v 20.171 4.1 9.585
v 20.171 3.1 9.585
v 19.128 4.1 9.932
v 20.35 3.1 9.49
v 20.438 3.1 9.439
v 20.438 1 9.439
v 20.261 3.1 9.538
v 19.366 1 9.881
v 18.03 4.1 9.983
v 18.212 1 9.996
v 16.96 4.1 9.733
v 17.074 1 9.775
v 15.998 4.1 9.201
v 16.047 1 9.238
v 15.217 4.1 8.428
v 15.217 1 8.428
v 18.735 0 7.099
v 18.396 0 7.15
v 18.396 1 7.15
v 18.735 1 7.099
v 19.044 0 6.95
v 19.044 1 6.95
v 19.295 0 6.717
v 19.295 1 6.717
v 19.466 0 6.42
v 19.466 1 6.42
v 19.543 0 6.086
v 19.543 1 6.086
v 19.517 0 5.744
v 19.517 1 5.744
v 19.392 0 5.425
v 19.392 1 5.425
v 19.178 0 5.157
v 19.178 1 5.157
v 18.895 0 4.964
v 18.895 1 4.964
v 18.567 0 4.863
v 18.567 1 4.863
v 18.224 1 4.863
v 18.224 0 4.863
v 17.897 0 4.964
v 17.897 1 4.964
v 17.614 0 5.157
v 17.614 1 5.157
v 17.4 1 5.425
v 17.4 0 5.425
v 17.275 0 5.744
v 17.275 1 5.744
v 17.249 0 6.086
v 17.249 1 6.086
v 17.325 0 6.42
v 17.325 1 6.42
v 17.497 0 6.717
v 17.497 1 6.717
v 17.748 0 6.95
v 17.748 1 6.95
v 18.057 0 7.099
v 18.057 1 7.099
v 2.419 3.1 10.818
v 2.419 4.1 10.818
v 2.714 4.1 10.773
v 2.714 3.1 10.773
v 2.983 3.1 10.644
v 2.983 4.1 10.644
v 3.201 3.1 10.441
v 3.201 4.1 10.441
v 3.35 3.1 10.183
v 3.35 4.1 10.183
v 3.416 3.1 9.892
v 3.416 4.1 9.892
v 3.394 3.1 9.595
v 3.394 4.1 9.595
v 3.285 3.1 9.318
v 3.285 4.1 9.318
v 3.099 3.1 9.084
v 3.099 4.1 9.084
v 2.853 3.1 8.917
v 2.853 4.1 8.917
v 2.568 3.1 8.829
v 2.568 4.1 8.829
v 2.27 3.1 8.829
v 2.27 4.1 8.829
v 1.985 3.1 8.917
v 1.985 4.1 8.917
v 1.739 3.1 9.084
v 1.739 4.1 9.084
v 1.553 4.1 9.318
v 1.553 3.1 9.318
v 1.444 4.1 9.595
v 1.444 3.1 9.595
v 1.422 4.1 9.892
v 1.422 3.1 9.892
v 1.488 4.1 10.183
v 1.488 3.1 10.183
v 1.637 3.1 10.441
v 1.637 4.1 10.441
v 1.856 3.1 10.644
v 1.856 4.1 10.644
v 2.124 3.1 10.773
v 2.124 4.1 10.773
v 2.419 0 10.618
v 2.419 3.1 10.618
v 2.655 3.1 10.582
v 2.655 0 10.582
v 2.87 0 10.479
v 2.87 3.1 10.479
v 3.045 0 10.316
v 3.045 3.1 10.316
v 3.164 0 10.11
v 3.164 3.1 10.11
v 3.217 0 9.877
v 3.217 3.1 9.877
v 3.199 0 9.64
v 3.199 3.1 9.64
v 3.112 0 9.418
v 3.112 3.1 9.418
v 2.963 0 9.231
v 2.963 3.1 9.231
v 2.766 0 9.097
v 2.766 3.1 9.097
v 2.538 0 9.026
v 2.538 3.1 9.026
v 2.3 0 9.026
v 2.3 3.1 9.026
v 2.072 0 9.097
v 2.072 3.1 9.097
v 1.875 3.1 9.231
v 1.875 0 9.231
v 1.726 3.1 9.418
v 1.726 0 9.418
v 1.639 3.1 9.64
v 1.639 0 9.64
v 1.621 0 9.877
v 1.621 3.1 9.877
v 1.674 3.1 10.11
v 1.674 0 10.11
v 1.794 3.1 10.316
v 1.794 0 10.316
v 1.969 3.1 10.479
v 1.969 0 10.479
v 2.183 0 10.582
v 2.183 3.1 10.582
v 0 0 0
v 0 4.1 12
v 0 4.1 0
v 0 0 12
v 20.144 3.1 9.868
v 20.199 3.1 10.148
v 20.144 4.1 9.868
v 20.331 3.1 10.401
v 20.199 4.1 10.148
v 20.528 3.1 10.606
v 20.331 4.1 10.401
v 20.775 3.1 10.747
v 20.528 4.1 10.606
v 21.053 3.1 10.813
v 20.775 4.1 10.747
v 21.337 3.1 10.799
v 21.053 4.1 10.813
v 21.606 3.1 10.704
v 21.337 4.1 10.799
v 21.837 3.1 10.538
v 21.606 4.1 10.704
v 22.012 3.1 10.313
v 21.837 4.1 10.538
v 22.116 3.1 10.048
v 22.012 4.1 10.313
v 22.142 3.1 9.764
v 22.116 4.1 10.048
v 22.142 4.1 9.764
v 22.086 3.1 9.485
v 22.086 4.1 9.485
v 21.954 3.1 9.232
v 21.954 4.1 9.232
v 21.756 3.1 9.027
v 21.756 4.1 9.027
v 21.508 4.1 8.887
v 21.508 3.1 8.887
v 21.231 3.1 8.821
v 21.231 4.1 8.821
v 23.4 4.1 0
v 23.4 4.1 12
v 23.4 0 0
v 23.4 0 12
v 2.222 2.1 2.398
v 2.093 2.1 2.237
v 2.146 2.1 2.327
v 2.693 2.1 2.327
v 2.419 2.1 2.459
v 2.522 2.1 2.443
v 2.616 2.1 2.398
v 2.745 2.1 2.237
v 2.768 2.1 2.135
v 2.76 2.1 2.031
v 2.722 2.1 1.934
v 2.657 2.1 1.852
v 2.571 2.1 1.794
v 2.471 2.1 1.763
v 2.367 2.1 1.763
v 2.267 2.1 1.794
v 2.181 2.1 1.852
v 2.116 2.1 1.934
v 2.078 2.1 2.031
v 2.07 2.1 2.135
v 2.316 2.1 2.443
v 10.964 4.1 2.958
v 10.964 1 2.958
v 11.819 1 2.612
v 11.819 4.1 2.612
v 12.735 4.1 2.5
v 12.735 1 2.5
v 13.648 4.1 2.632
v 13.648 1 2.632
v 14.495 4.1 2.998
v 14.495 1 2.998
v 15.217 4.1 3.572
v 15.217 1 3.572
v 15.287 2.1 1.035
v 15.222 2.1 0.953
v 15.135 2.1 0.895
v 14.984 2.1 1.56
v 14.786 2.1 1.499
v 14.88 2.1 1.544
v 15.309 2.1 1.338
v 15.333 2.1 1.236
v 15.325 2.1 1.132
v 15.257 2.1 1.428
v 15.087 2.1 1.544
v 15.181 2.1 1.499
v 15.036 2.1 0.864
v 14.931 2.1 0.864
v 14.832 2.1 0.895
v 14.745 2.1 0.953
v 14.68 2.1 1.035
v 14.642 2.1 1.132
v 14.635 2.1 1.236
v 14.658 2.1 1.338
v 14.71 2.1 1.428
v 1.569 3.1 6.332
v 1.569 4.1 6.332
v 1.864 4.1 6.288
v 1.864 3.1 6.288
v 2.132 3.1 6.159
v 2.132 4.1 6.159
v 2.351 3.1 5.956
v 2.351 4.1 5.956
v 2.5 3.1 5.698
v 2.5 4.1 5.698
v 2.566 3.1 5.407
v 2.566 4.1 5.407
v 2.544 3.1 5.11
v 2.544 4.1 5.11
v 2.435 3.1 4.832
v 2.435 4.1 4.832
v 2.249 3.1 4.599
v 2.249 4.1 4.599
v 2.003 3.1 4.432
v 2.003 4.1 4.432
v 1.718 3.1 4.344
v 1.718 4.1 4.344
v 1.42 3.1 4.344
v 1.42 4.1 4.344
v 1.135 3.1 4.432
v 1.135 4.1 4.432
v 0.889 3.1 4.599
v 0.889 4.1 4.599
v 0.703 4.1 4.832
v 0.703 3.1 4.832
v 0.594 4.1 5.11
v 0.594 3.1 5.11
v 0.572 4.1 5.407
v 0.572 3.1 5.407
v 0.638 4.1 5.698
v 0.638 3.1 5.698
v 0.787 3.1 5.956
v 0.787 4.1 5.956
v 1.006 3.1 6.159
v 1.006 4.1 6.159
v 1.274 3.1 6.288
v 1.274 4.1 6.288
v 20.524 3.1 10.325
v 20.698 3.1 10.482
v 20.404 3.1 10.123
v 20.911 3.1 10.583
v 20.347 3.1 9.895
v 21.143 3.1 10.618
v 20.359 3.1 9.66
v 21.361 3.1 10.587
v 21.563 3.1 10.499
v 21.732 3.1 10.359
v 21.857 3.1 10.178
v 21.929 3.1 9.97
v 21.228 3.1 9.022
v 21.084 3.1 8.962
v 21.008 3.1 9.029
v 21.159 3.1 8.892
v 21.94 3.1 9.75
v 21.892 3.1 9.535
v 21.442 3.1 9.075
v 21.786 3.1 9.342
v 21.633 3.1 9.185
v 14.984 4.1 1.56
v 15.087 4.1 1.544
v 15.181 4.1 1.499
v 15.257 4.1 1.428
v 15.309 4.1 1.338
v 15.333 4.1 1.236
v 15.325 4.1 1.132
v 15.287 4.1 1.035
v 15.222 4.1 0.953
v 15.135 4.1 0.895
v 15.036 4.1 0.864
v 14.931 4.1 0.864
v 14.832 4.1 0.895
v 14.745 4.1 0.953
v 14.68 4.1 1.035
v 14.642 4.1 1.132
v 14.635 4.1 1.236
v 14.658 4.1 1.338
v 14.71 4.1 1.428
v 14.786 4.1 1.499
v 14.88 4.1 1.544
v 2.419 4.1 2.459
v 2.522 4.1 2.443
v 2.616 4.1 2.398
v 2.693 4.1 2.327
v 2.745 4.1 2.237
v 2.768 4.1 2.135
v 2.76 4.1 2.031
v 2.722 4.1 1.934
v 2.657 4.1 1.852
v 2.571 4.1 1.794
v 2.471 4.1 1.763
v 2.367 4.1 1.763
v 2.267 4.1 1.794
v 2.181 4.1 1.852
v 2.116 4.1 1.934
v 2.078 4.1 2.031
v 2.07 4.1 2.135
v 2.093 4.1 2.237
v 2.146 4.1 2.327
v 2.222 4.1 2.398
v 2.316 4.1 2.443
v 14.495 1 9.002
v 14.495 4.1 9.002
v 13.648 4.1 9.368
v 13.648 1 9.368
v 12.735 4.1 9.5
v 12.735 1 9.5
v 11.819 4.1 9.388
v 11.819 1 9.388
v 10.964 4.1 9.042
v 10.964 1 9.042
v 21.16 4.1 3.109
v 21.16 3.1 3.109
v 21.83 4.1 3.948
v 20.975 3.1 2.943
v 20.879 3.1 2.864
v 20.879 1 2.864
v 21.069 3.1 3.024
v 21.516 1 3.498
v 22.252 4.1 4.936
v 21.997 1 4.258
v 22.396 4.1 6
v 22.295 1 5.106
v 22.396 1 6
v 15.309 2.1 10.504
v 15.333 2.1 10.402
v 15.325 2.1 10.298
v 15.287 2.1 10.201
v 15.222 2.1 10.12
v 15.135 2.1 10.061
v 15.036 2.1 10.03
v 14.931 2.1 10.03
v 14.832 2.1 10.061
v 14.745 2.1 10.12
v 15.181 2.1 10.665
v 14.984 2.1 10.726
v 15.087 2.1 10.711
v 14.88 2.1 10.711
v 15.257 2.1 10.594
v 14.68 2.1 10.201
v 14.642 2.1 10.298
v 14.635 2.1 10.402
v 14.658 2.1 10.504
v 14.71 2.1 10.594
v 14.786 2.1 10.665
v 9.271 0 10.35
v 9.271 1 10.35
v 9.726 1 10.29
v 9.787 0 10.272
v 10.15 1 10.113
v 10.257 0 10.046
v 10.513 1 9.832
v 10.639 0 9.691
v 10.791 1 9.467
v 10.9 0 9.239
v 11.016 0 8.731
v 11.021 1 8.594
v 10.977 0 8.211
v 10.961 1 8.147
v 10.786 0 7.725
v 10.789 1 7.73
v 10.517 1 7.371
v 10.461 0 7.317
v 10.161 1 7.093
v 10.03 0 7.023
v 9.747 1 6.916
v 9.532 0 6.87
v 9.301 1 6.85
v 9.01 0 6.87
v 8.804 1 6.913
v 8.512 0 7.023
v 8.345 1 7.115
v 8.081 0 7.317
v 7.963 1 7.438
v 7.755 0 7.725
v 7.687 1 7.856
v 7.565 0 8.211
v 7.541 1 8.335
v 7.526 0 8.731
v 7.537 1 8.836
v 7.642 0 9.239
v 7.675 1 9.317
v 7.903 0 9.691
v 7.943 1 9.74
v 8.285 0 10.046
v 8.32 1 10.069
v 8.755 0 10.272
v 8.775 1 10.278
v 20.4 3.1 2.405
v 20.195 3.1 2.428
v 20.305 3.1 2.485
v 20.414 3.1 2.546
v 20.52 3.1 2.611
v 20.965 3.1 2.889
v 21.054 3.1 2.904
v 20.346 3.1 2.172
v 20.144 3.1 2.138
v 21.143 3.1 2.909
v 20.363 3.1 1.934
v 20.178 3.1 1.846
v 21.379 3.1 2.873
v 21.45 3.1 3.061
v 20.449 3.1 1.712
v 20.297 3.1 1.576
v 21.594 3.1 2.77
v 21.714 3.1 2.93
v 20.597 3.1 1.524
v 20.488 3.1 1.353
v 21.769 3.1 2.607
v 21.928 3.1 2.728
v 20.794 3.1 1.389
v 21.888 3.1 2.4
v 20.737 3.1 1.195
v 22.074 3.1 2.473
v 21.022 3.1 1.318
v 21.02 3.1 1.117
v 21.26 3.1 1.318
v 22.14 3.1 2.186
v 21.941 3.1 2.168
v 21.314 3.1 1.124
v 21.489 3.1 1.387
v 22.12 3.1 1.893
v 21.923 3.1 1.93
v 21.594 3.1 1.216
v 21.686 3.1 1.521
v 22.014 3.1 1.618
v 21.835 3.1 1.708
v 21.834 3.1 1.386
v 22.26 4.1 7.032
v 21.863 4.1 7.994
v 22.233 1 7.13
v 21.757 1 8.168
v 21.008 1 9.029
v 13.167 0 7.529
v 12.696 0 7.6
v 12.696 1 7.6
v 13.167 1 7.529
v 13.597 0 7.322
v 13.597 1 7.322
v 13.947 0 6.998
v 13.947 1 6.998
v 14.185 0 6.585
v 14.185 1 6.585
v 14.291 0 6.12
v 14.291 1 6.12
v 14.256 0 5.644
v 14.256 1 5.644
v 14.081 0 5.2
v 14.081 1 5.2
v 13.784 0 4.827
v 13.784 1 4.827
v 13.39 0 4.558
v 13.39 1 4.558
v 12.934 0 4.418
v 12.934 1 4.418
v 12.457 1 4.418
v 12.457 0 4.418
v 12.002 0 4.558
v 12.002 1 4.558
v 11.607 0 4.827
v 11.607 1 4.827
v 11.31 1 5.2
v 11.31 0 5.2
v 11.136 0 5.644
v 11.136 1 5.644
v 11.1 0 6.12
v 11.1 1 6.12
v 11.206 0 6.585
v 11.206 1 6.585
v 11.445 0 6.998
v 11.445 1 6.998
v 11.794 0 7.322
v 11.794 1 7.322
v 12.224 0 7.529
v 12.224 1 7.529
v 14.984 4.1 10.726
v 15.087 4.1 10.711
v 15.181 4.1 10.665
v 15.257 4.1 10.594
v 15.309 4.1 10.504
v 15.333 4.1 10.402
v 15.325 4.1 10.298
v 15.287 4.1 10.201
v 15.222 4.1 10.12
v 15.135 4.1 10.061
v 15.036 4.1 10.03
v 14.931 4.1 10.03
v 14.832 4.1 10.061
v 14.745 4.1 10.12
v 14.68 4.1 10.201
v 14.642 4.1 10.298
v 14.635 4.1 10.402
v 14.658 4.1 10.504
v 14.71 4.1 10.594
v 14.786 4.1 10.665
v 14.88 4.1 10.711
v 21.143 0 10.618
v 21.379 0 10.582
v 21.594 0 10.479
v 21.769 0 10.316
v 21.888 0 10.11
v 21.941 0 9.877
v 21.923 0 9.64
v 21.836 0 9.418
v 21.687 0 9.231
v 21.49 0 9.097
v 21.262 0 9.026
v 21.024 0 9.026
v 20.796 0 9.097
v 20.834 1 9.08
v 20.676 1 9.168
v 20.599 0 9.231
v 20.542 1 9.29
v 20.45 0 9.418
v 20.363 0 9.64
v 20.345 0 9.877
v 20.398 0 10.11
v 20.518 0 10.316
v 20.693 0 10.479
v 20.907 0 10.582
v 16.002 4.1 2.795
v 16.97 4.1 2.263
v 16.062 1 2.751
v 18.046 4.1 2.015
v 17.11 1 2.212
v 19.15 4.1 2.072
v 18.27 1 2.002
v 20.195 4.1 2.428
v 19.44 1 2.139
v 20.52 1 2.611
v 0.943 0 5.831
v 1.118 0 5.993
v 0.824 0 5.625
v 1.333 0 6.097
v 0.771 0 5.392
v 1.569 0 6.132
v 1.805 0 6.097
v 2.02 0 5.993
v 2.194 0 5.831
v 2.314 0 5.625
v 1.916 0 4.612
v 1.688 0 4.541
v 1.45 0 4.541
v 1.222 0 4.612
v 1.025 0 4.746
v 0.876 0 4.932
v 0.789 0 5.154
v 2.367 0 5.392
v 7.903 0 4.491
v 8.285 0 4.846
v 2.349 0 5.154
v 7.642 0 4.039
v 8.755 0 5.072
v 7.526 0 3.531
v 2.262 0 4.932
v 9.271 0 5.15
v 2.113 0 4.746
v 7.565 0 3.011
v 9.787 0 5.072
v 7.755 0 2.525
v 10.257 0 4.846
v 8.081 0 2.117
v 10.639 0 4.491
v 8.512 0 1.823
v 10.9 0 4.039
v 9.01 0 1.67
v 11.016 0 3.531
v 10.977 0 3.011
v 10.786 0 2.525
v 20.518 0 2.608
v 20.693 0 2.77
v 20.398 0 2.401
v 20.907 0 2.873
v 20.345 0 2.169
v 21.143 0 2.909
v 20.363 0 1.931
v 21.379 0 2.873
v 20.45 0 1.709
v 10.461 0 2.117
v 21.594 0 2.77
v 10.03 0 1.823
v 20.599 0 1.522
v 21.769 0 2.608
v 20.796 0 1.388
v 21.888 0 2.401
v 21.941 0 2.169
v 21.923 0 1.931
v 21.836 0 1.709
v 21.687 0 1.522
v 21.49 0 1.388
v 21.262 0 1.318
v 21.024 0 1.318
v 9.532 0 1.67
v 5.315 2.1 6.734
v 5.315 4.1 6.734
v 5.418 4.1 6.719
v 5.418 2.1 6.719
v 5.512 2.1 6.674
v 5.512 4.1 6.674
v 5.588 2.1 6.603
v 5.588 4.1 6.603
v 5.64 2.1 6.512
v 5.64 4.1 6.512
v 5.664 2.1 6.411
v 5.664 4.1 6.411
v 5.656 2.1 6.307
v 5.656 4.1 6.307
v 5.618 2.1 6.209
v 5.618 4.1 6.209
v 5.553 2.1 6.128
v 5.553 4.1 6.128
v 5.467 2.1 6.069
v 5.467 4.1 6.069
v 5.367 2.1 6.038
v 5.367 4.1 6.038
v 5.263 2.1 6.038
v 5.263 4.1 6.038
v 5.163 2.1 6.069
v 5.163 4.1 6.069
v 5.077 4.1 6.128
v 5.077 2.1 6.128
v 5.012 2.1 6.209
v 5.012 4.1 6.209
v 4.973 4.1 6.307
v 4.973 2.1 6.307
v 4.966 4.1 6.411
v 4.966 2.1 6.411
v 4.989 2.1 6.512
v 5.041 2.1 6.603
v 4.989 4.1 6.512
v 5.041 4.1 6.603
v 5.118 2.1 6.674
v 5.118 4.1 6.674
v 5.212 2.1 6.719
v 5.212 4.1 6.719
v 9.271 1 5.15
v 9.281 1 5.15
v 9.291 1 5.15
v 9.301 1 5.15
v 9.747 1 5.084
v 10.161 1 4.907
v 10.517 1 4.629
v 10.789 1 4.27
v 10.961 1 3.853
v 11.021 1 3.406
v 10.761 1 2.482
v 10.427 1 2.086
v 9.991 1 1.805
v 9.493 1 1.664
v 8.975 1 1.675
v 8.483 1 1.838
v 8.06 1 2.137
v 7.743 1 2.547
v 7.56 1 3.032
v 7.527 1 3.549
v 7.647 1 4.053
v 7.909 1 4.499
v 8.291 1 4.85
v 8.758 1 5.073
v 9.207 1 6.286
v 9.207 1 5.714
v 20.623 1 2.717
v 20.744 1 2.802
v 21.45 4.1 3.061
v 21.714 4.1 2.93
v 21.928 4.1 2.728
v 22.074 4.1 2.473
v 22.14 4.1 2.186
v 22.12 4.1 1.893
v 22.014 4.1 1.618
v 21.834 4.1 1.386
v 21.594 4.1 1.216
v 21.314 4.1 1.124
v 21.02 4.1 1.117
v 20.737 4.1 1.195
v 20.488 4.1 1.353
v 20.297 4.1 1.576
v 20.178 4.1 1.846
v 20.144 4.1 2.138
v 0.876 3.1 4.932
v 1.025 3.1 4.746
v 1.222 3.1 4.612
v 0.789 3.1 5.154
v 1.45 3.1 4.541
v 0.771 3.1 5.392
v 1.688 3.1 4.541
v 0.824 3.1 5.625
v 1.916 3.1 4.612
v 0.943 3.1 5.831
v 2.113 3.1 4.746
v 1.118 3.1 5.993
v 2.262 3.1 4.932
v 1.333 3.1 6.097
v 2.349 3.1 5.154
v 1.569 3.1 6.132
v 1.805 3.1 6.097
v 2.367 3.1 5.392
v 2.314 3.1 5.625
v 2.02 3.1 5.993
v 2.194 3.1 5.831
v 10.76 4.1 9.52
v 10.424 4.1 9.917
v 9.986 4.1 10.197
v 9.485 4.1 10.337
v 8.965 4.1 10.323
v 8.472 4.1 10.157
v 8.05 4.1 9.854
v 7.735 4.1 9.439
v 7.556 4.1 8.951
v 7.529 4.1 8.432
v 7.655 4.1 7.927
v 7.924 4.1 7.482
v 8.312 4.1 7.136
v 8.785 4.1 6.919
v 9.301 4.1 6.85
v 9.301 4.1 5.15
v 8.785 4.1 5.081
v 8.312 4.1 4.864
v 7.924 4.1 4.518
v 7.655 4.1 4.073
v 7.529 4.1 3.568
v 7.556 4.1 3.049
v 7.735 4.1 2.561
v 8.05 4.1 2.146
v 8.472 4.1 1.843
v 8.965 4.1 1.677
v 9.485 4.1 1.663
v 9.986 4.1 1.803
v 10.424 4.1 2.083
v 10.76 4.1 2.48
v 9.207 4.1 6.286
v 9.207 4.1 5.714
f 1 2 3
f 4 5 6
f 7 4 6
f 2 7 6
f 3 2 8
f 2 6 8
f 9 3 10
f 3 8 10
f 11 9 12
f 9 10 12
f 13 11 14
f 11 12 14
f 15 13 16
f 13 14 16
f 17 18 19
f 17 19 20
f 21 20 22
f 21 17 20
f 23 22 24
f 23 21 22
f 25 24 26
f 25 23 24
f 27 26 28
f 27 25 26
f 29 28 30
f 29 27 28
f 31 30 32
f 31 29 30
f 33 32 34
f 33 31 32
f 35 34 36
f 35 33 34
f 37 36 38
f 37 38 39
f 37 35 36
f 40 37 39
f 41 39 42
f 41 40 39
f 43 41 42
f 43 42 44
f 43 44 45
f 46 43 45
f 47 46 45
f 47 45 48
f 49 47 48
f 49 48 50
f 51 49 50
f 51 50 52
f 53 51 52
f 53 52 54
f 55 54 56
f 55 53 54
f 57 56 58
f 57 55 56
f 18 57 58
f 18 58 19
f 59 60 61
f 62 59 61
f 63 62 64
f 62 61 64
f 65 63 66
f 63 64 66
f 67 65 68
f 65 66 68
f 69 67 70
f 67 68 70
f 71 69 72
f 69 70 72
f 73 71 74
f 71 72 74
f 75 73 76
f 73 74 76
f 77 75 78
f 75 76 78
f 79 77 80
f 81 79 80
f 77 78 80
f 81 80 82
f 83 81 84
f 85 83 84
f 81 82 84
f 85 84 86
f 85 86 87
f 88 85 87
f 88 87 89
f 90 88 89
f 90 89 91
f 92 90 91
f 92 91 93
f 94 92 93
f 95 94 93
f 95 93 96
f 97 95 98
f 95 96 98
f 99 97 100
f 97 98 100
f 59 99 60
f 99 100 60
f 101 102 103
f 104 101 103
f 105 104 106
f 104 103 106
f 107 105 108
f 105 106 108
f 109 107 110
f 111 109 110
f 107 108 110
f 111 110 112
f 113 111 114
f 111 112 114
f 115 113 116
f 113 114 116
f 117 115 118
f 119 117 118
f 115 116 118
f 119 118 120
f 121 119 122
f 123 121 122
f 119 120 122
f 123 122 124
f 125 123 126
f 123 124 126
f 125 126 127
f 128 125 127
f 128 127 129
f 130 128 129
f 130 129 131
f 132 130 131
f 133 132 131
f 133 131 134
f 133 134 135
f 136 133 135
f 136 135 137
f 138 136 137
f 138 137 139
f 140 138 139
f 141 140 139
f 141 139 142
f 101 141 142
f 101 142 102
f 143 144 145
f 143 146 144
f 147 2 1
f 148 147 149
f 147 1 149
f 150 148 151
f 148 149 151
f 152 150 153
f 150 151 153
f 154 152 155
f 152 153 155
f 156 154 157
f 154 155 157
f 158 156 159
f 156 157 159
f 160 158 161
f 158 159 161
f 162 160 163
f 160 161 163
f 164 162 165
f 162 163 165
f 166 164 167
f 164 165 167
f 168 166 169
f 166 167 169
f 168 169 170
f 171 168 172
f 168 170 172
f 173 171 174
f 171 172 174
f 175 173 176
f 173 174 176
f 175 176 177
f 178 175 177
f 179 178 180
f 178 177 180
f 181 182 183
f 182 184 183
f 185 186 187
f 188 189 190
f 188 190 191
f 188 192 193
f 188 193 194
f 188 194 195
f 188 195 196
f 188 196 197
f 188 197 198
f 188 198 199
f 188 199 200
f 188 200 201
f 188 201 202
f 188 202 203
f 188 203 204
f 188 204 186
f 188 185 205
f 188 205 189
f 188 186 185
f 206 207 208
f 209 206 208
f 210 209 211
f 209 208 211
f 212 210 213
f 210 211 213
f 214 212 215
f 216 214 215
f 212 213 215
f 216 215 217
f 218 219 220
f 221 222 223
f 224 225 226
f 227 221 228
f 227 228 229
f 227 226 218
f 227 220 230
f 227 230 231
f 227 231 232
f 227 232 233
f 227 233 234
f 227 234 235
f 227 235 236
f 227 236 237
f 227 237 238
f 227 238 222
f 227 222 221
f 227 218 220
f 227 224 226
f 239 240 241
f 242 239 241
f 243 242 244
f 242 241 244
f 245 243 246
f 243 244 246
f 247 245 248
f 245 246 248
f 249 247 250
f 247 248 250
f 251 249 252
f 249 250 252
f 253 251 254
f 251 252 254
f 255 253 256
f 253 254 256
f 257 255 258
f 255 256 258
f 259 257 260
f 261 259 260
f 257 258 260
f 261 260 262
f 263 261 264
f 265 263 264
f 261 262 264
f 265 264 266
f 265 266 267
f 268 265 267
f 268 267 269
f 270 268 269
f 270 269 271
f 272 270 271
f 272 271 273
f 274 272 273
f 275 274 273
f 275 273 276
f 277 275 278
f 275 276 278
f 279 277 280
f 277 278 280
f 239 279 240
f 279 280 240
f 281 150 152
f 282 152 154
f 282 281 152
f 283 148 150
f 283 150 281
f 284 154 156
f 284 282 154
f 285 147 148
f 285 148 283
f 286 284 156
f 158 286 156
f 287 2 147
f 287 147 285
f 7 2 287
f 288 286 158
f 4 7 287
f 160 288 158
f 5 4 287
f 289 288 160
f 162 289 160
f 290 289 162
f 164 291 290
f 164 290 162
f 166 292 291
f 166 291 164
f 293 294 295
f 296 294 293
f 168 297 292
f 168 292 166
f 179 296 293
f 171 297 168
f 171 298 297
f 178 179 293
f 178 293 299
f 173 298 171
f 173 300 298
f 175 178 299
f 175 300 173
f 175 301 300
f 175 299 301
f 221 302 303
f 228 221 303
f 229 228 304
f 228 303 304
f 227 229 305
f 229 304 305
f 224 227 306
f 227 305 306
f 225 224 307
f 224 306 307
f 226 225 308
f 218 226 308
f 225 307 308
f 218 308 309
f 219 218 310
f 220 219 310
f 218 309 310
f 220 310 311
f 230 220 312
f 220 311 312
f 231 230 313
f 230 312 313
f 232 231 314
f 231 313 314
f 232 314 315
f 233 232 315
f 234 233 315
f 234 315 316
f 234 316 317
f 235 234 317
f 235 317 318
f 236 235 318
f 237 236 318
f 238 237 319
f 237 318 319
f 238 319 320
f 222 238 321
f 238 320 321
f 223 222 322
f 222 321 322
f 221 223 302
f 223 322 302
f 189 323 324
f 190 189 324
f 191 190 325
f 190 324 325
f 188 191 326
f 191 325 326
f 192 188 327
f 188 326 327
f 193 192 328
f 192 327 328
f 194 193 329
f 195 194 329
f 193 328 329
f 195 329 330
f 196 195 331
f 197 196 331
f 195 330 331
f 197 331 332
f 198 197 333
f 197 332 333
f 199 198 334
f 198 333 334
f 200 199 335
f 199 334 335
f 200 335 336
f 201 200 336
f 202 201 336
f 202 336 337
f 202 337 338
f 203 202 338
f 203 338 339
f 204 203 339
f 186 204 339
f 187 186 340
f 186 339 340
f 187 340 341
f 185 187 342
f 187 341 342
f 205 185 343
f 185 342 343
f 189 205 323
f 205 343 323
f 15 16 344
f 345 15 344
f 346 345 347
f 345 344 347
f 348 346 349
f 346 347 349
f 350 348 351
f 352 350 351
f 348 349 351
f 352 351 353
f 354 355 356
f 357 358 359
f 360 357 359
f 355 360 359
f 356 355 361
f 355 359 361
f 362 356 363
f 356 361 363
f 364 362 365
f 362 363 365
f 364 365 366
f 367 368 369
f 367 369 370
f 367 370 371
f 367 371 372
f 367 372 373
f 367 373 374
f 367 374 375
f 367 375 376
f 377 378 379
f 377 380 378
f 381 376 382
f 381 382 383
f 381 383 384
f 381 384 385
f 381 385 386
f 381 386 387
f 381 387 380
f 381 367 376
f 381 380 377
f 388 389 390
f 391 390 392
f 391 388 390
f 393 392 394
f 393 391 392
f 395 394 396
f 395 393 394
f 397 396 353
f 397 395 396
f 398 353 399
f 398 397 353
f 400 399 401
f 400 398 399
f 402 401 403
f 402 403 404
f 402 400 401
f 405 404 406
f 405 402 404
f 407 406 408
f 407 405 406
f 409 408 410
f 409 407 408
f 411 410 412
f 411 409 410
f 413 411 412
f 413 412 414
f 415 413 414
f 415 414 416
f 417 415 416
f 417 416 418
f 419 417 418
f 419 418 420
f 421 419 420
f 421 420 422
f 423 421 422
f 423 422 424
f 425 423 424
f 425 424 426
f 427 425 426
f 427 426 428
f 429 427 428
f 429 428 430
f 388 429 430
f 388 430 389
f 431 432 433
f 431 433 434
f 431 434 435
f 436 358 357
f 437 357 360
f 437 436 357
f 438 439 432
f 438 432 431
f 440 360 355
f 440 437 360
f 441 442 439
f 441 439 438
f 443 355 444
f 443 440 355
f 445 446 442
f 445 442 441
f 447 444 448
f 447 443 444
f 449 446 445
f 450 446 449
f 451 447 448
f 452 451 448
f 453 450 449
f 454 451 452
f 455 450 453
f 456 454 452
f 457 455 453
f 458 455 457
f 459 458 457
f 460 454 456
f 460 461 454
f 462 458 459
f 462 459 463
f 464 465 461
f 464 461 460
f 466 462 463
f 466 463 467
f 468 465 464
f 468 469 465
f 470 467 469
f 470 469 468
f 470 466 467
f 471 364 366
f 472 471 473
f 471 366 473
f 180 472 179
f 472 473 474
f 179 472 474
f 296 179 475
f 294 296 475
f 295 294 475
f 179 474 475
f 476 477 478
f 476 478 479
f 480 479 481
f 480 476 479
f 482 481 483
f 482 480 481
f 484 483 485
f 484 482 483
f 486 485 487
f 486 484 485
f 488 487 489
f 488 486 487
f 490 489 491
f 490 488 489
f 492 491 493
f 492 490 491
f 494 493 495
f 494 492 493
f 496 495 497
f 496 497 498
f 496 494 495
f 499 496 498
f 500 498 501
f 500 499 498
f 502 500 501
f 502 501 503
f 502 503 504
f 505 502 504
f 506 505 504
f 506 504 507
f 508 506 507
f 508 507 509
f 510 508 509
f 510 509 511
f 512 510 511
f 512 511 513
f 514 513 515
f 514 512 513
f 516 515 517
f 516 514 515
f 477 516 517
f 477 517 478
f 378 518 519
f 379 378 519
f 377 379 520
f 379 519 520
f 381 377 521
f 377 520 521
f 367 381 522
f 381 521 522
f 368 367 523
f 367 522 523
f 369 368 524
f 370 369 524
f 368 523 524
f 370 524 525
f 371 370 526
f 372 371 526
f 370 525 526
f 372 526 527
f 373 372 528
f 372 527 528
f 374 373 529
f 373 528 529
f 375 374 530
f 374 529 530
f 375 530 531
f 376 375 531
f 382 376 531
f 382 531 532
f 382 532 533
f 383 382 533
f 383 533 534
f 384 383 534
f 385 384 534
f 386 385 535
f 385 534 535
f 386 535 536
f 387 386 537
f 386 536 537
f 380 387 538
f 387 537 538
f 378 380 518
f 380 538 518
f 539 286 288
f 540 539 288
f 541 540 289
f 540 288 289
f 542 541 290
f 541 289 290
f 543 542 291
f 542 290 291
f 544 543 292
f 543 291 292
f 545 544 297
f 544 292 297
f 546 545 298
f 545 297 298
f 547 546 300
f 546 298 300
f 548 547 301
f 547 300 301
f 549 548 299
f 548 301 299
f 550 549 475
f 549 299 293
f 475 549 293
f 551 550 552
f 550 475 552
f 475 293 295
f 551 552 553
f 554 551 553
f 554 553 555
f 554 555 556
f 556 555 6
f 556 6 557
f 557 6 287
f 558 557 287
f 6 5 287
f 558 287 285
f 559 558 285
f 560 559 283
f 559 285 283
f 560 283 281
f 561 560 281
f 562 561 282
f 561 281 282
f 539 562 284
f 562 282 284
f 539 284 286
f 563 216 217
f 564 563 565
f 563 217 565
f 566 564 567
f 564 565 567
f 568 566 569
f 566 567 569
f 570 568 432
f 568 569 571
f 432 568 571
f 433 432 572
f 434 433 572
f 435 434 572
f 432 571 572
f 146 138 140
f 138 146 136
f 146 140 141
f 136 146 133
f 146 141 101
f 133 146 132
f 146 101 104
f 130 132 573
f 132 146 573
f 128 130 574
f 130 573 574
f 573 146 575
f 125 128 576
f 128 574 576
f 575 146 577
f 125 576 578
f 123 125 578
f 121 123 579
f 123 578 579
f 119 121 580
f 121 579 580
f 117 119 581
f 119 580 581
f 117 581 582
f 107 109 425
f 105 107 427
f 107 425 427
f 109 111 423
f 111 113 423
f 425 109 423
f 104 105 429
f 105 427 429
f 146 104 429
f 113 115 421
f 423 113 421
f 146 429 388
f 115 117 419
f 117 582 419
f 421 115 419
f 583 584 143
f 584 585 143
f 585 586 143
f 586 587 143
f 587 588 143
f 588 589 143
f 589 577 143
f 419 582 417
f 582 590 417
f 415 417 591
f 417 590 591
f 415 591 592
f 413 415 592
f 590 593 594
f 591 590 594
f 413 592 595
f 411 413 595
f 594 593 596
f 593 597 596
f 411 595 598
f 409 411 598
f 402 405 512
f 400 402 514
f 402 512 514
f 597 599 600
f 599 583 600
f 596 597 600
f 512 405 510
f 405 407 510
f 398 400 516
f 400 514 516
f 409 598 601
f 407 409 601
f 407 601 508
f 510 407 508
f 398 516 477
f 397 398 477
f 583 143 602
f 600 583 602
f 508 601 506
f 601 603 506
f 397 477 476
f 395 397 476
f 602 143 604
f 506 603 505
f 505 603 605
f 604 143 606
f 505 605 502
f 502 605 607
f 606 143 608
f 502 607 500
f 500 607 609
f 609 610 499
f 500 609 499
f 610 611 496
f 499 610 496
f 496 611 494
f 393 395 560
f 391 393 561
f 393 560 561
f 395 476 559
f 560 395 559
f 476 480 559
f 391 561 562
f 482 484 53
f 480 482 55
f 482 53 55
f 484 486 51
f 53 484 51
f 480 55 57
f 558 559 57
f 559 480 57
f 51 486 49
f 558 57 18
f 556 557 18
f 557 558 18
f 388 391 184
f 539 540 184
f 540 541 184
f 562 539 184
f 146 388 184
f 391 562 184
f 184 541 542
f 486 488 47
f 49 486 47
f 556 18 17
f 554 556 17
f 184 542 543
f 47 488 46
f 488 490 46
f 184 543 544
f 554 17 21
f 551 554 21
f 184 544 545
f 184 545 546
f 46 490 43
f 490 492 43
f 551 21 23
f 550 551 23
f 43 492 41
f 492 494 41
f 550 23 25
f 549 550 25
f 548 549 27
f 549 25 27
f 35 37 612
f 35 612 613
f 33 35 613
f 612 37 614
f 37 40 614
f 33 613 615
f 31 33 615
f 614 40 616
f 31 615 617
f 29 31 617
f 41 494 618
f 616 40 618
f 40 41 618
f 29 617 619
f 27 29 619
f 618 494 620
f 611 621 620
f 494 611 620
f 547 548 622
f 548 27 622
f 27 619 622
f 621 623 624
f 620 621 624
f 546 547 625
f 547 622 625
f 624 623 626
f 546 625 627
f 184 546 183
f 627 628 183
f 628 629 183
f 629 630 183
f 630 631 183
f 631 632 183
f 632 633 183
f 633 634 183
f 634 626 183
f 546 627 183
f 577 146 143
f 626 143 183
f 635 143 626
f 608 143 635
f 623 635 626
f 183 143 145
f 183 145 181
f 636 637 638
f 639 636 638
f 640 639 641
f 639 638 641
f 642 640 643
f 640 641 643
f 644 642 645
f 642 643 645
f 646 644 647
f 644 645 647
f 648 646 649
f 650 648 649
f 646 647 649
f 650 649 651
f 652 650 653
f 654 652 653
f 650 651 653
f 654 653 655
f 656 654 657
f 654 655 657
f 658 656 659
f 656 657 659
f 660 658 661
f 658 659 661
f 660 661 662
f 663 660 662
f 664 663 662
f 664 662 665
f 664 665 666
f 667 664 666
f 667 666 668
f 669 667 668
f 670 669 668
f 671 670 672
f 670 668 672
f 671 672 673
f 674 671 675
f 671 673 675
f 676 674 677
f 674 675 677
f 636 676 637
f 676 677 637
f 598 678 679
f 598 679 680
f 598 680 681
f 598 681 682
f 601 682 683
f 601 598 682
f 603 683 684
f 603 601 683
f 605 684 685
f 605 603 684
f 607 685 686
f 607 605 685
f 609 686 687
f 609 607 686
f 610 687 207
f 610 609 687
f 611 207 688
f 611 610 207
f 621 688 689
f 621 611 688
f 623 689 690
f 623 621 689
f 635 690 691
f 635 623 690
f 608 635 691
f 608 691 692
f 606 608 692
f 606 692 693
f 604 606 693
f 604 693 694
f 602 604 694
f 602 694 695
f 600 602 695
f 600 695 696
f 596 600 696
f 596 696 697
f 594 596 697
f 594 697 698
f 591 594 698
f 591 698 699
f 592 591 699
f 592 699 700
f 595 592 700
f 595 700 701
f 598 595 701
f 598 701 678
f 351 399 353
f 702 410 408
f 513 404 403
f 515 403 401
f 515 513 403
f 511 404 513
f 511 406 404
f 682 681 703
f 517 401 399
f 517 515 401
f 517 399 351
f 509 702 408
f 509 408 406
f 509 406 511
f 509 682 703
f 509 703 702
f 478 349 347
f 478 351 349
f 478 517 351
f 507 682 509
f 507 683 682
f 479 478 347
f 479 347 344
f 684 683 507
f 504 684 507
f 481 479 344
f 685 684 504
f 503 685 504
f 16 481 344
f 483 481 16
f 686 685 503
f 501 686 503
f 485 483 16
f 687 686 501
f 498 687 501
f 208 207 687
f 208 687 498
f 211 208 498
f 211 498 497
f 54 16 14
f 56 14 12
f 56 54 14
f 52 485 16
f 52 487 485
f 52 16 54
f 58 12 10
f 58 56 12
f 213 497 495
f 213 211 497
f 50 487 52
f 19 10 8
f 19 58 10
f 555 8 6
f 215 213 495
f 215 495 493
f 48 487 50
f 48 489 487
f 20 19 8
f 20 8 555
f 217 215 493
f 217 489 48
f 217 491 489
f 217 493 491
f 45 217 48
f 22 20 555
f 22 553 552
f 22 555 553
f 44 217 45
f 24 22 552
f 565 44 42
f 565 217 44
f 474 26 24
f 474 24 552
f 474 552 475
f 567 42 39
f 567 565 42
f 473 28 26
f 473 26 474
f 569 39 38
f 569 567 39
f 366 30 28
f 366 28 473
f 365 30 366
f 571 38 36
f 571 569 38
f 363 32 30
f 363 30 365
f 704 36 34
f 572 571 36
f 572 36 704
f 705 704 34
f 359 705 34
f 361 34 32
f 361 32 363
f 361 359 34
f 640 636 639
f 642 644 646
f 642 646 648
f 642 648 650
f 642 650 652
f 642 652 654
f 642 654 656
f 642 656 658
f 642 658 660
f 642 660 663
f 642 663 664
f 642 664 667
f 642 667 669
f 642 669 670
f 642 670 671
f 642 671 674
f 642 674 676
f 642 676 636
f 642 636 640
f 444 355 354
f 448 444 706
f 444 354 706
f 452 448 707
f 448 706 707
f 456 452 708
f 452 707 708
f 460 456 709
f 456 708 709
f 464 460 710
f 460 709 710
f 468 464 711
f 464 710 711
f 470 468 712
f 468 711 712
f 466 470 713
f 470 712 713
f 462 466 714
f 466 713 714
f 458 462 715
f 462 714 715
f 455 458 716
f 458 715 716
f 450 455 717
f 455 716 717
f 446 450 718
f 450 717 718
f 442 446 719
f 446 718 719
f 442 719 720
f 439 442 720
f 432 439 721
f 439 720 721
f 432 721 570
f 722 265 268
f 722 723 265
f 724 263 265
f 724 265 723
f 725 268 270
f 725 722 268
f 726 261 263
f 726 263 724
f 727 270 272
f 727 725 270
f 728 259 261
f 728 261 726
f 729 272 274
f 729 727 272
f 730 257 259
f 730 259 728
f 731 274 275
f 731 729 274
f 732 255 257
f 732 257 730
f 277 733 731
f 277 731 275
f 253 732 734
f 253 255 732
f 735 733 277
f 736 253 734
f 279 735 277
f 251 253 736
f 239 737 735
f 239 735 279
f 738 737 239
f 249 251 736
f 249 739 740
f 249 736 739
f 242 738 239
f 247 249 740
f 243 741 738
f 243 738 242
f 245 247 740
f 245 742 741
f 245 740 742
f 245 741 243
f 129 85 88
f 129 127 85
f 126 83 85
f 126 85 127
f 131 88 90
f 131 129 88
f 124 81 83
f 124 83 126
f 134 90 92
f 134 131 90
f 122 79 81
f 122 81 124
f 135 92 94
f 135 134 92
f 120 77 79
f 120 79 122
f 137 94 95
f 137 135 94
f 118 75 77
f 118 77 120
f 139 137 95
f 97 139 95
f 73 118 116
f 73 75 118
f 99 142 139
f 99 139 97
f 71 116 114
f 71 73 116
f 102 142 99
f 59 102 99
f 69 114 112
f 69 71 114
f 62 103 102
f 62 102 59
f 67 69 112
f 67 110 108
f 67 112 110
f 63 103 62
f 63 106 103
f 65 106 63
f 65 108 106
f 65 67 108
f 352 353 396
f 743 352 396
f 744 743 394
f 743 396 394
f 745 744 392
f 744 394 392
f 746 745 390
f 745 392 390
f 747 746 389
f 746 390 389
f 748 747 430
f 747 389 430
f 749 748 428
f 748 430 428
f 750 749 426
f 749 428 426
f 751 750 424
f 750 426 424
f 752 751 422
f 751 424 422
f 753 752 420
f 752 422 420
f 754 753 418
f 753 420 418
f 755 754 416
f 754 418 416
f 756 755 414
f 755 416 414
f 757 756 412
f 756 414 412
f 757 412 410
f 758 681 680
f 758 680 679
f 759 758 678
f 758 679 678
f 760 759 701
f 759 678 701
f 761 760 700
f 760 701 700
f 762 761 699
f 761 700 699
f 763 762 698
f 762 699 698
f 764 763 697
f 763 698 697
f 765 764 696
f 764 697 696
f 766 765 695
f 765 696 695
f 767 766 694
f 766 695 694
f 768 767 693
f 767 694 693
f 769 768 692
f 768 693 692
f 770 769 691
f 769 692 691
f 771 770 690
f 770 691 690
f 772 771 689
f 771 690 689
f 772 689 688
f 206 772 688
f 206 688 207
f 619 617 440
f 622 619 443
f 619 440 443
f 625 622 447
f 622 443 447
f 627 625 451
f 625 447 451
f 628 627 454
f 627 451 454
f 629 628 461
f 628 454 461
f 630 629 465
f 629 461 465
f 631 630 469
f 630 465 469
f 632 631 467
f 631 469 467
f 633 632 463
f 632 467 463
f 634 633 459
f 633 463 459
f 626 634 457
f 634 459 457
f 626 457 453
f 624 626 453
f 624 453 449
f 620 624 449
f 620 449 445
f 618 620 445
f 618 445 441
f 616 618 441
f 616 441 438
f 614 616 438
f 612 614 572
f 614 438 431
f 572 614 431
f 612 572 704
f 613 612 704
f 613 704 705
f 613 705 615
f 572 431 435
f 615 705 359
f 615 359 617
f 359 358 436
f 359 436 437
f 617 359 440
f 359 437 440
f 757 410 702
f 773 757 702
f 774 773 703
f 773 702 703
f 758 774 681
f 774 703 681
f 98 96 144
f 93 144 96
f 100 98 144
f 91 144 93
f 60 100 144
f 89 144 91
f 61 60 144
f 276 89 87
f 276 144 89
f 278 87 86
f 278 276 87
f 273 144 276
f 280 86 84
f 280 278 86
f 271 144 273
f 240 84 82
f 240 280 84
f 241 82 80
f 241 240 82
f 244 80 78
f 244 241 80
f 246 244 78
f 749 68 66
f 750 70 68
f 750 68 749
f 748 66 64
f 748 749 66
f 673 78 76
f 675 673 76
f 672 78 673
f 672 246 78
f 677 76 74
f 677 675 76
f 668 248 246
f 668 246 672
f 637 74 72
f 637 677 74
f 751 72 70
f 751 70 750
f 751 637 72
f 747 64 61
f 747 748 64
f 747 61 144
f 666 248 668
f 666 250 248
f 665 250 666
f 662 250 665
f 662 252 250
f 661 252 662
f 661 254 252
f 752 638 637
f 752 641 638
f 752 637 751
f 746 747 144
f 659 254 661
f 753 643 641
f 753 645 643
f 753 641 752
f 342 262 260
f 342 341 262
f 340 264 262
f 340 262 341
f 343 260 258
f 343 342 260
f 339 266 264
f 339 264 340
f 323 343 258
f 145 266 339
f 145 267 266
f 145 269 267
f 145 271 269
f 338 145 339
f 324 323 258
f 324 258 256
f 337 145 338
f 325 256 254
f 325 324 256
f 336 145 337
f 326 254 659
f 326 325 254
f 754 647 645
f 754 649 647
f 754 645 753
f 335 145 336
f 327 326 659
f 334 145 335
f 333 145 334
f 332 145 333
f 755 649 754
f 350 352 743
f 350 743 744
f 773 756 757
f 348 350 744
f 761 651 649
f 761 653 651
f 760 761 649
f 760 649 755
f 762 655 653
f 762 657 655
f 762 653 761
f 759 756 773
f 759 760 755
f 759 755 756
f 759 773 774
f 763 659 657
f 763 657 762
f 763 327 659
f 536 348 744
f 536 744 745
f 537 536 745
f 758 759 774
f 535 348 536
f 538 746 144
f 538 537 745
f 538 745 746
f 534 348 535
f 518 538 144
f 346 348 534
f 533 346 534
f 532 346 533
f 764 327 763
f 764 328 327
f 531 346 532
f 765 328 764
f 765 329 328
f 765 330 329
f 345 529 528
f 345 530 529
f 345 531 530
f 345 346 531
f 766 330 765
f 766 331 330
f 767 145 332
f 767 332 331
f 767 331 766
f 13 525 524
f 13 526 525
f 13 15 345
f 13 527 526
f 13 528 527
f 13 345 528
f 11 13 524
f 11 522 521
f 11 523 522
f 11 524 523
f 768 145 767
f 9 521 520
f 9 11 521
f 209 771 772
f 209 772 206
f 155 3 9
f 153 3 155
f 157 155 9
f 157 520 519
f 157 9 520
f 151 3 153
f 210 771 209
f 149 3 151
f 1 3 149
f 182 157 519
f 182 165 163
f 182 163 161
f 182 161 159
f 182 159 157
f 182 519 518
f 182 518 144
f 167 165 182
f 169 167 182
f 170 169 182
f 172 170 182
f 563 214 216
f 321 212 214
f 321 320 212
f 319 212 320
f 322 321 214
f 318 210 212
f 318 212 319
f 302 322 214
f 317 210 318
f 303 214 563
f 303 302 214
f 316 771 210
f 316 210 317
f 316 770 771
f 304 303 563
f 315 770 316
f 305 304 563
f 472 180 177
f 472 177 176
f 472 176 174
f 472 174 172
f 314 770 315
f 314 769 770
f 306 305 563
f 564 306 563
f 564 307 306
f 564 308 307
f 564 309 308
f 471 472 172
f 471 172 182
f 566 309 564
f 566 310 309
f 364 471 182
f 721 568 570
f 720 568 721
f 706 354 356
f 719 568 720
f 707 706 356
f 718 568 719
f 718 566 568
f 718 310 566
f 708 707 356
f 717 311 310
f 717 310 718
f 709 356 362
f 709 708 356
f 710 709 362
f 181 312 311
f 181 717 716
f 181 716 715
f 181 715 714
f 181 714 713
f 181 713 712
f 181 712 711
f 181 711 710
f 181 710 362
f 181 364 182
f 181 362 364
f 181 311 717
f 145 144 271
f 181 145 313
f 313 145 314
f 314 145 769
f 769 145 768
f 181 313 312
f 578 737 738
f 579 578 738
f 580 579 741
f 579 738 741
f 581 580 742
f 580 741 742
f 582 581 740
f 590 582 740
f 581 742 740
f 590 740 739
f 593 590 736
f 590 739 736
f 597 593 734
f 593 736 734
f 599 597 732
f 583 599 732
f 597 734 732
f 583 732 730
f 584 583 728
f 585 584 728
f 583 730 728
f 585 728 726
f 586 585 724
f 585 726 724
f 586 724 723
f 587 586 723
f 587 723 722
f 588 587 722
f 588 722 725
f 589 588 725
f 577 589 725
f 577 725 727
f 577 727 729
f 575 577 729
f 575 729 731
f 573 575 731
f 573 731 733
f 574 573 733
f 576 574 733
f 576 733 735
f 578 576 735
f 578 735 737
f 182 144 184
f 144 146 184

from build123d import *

# Parameters (mm, degrees)
SKETCH_1_W          = 23.4
SKETCH_1_H          = 12
SKETCH_1_R          = 1.75
SKETCH_1_R_2        = 1.6
SKETCH_1_R_3        = 1.15
EXTRUDE_1_DEPTH     = 1
EXTRUDE_START       = 1
SKETCH_1_4_W        = 23.4
SKETCH_1_4_H        = 12
EXTRUDE_2_DEPTH     = 3.1
SKETCH_3_R          = 0.35
CUT_EXTRUDE_3_DEPTH = 2
SKETCH_3_3_R        = 1
CUT_EXTRUDE_4_DEPTH = 1
SKETCH_3_4_R        = 0.8
CUT_EXTRUDE_5_DEPTH = 27.615221209


with BuildPart() as part:
    # 草图1 → 凸台-拉伸1 (new body)
    with BuildSketch(Plane(origin=(0, 0, 0), x_dir=(1, 0, 0), z_dir=(0, 1, 0))):
        with Locations((11.7, -6)):
            Rectangle(SKETCH_1_W, SKETCH_1_H)
        with Locations(Location((9.270831301, -3.4, 0), (0, 0, 270))):
            Circle(SKETCH_1_R, mode=Mode.SUBTRACT)
        with Locations(Location((9.270831301, -8.6, 0), (0, 0, 270))):
            Circle(SKETCH_1_R, mode=Mode.SUBTRACT)
        with Locations(Location((12.695740059, -6, 0), (0, 0, 270))):
            Circle(SKETCH_1_R_2, mode=Mode.SUBTRACT)
        with Locations(Location((18.395740059, -6, 0), (0, 0, 270))):
            Circle(SKETCH_1_R_3, mode=Mode.SUBTRACT)
    extrude(amount=EXTRUDE_1_DEPTH)

    # 草图1<4> → 凸台-拉伸2 (add)
    with BuildSketch(Plane(origin=(0, 0, 0), x_dir=(1, 0, 0), z_dir=(0, 1, 0)).offset(EXTRUDE_START)):
        with Locations((11.7, -6)):
            Rectangle(SKETCH_1_4_W, SKETCH_1_4_H)
        with BuildLine():
            ThreePointArc((9.300586178, -5.149747024), (7.876973085, -2.341860465), (10.964181547, -2.958338428))
            ThreePointArc((10.964181547, -2.958338428), (13.1957667, -2.53590223), (15.21679269, -3.572183362))
            ThreePointArc((15.21679269, -3.572183362), (19.67718661, -2.210818725), (22.395740059, -6))
            ThreePointArc((22.395740059, -6), (19.67718661, -9.789181275), (15.21679269, -8.427816638))
            ThreePointArc((15.21679269, -8.427816638), (13.1957667, -9.46409777), (10.964181547, -9.041661572))
            ThreePointArc((10.964181547, -9.041661572), (7.876973085, -9.658139535), (9.300586178, -6.850252976))
            ThreePointArc((9.300586178, -6.850252976), (9.195740059, -6), (9.300586178, -5.149747024))
        make_face(mode=Mode.SUBTRACT)
    extrude(amount=EXTRUDE_2_DEPTH)

    # 草图3 → 切除-拉伸3 (cut)
    with BuildSketch(Plane(origin=(0, 4.1, 0), x_dir=(1, 0, 0), z_dir=(0, 1, 0))):
        with Locations(Location((2.419185522, -2.108925173, 0), (0, 0, 270))):
            Circle(SKETCH_3_R)
        with Locations(Location((14.983521503, -1.209932246, 0), (0, 0, 270))):
            Circle(SKETCH_3_R)
        with Locations(Location((14.983521503, -10.376111281, 0), (0, 0, 270))):
            Circle(SKETCH_3_R)
        with Locations(Location((5.314681037, -6.384388153, 0), (0, 0, 270))):
            Circle(SKETCH_3_R)
    extrude(amount=-CUT_EXTRUDE_3_DEPTH, mode=Mode.SUBTRACT)

    # 草图3<3> → 切除-拉伸4 (cut)
    with BuildSketch(Plane(origin=(0, 4.1, 0), x_dir=(1, 0, 0), z_dir=(0, 1, 0))):
        with Locations(Location((1.568943185, -5.332489754, 0), (0, 0, 270))):
            Circle(SKETCH_3_3_R)
        with Locations(Location((2.419185522, -9.817518082, 0), (0, 0, 270))):
            Circle(SKETCH_3_3_R)
        with Locations((21.143175994, -2.108925173)):
            Circle(SKETCH_3_3_R)
        with Locations((21.143175994, -9.817518082)):
            Circle(SKETCH_3_3_R)
    extrude(amount=-CUT_EXTRUDE_4_DEPTH, mode=Mode.SUBTRACT)

    # 草图3<4> → 切除-拉伸5 (cut, through all)
    with BuildSketch(Plane(origin=(0, 4.1, 0), x_dir=(1, 0, 0), z_dir=(0, 1, 0))):
        with Locations(Location((1.568943185, -5.332489754, 0), (0, 0, 270))):
            Circle(SKETCH_3_4_R)
        with Locations(Location((21.143175994, -2.108925173, 0), (0, 0, 270))):
            Circle(SKETCH_3_4_R)
        with Locations(Location((2.419185522, -9.817518082, 0), (0, 0, 270))):
            Circle(SKETCH_3_4_R)
        with Locations(Location((21.143175994, -9.817518082, 0), (0, 0, 270))):
            Circle(SKETCH_3_4_R)
    extrude(amount=-CUT_EXTRUDE_5_DEPTH, mode=Mode.SUBTRACT)


solid = part.part
